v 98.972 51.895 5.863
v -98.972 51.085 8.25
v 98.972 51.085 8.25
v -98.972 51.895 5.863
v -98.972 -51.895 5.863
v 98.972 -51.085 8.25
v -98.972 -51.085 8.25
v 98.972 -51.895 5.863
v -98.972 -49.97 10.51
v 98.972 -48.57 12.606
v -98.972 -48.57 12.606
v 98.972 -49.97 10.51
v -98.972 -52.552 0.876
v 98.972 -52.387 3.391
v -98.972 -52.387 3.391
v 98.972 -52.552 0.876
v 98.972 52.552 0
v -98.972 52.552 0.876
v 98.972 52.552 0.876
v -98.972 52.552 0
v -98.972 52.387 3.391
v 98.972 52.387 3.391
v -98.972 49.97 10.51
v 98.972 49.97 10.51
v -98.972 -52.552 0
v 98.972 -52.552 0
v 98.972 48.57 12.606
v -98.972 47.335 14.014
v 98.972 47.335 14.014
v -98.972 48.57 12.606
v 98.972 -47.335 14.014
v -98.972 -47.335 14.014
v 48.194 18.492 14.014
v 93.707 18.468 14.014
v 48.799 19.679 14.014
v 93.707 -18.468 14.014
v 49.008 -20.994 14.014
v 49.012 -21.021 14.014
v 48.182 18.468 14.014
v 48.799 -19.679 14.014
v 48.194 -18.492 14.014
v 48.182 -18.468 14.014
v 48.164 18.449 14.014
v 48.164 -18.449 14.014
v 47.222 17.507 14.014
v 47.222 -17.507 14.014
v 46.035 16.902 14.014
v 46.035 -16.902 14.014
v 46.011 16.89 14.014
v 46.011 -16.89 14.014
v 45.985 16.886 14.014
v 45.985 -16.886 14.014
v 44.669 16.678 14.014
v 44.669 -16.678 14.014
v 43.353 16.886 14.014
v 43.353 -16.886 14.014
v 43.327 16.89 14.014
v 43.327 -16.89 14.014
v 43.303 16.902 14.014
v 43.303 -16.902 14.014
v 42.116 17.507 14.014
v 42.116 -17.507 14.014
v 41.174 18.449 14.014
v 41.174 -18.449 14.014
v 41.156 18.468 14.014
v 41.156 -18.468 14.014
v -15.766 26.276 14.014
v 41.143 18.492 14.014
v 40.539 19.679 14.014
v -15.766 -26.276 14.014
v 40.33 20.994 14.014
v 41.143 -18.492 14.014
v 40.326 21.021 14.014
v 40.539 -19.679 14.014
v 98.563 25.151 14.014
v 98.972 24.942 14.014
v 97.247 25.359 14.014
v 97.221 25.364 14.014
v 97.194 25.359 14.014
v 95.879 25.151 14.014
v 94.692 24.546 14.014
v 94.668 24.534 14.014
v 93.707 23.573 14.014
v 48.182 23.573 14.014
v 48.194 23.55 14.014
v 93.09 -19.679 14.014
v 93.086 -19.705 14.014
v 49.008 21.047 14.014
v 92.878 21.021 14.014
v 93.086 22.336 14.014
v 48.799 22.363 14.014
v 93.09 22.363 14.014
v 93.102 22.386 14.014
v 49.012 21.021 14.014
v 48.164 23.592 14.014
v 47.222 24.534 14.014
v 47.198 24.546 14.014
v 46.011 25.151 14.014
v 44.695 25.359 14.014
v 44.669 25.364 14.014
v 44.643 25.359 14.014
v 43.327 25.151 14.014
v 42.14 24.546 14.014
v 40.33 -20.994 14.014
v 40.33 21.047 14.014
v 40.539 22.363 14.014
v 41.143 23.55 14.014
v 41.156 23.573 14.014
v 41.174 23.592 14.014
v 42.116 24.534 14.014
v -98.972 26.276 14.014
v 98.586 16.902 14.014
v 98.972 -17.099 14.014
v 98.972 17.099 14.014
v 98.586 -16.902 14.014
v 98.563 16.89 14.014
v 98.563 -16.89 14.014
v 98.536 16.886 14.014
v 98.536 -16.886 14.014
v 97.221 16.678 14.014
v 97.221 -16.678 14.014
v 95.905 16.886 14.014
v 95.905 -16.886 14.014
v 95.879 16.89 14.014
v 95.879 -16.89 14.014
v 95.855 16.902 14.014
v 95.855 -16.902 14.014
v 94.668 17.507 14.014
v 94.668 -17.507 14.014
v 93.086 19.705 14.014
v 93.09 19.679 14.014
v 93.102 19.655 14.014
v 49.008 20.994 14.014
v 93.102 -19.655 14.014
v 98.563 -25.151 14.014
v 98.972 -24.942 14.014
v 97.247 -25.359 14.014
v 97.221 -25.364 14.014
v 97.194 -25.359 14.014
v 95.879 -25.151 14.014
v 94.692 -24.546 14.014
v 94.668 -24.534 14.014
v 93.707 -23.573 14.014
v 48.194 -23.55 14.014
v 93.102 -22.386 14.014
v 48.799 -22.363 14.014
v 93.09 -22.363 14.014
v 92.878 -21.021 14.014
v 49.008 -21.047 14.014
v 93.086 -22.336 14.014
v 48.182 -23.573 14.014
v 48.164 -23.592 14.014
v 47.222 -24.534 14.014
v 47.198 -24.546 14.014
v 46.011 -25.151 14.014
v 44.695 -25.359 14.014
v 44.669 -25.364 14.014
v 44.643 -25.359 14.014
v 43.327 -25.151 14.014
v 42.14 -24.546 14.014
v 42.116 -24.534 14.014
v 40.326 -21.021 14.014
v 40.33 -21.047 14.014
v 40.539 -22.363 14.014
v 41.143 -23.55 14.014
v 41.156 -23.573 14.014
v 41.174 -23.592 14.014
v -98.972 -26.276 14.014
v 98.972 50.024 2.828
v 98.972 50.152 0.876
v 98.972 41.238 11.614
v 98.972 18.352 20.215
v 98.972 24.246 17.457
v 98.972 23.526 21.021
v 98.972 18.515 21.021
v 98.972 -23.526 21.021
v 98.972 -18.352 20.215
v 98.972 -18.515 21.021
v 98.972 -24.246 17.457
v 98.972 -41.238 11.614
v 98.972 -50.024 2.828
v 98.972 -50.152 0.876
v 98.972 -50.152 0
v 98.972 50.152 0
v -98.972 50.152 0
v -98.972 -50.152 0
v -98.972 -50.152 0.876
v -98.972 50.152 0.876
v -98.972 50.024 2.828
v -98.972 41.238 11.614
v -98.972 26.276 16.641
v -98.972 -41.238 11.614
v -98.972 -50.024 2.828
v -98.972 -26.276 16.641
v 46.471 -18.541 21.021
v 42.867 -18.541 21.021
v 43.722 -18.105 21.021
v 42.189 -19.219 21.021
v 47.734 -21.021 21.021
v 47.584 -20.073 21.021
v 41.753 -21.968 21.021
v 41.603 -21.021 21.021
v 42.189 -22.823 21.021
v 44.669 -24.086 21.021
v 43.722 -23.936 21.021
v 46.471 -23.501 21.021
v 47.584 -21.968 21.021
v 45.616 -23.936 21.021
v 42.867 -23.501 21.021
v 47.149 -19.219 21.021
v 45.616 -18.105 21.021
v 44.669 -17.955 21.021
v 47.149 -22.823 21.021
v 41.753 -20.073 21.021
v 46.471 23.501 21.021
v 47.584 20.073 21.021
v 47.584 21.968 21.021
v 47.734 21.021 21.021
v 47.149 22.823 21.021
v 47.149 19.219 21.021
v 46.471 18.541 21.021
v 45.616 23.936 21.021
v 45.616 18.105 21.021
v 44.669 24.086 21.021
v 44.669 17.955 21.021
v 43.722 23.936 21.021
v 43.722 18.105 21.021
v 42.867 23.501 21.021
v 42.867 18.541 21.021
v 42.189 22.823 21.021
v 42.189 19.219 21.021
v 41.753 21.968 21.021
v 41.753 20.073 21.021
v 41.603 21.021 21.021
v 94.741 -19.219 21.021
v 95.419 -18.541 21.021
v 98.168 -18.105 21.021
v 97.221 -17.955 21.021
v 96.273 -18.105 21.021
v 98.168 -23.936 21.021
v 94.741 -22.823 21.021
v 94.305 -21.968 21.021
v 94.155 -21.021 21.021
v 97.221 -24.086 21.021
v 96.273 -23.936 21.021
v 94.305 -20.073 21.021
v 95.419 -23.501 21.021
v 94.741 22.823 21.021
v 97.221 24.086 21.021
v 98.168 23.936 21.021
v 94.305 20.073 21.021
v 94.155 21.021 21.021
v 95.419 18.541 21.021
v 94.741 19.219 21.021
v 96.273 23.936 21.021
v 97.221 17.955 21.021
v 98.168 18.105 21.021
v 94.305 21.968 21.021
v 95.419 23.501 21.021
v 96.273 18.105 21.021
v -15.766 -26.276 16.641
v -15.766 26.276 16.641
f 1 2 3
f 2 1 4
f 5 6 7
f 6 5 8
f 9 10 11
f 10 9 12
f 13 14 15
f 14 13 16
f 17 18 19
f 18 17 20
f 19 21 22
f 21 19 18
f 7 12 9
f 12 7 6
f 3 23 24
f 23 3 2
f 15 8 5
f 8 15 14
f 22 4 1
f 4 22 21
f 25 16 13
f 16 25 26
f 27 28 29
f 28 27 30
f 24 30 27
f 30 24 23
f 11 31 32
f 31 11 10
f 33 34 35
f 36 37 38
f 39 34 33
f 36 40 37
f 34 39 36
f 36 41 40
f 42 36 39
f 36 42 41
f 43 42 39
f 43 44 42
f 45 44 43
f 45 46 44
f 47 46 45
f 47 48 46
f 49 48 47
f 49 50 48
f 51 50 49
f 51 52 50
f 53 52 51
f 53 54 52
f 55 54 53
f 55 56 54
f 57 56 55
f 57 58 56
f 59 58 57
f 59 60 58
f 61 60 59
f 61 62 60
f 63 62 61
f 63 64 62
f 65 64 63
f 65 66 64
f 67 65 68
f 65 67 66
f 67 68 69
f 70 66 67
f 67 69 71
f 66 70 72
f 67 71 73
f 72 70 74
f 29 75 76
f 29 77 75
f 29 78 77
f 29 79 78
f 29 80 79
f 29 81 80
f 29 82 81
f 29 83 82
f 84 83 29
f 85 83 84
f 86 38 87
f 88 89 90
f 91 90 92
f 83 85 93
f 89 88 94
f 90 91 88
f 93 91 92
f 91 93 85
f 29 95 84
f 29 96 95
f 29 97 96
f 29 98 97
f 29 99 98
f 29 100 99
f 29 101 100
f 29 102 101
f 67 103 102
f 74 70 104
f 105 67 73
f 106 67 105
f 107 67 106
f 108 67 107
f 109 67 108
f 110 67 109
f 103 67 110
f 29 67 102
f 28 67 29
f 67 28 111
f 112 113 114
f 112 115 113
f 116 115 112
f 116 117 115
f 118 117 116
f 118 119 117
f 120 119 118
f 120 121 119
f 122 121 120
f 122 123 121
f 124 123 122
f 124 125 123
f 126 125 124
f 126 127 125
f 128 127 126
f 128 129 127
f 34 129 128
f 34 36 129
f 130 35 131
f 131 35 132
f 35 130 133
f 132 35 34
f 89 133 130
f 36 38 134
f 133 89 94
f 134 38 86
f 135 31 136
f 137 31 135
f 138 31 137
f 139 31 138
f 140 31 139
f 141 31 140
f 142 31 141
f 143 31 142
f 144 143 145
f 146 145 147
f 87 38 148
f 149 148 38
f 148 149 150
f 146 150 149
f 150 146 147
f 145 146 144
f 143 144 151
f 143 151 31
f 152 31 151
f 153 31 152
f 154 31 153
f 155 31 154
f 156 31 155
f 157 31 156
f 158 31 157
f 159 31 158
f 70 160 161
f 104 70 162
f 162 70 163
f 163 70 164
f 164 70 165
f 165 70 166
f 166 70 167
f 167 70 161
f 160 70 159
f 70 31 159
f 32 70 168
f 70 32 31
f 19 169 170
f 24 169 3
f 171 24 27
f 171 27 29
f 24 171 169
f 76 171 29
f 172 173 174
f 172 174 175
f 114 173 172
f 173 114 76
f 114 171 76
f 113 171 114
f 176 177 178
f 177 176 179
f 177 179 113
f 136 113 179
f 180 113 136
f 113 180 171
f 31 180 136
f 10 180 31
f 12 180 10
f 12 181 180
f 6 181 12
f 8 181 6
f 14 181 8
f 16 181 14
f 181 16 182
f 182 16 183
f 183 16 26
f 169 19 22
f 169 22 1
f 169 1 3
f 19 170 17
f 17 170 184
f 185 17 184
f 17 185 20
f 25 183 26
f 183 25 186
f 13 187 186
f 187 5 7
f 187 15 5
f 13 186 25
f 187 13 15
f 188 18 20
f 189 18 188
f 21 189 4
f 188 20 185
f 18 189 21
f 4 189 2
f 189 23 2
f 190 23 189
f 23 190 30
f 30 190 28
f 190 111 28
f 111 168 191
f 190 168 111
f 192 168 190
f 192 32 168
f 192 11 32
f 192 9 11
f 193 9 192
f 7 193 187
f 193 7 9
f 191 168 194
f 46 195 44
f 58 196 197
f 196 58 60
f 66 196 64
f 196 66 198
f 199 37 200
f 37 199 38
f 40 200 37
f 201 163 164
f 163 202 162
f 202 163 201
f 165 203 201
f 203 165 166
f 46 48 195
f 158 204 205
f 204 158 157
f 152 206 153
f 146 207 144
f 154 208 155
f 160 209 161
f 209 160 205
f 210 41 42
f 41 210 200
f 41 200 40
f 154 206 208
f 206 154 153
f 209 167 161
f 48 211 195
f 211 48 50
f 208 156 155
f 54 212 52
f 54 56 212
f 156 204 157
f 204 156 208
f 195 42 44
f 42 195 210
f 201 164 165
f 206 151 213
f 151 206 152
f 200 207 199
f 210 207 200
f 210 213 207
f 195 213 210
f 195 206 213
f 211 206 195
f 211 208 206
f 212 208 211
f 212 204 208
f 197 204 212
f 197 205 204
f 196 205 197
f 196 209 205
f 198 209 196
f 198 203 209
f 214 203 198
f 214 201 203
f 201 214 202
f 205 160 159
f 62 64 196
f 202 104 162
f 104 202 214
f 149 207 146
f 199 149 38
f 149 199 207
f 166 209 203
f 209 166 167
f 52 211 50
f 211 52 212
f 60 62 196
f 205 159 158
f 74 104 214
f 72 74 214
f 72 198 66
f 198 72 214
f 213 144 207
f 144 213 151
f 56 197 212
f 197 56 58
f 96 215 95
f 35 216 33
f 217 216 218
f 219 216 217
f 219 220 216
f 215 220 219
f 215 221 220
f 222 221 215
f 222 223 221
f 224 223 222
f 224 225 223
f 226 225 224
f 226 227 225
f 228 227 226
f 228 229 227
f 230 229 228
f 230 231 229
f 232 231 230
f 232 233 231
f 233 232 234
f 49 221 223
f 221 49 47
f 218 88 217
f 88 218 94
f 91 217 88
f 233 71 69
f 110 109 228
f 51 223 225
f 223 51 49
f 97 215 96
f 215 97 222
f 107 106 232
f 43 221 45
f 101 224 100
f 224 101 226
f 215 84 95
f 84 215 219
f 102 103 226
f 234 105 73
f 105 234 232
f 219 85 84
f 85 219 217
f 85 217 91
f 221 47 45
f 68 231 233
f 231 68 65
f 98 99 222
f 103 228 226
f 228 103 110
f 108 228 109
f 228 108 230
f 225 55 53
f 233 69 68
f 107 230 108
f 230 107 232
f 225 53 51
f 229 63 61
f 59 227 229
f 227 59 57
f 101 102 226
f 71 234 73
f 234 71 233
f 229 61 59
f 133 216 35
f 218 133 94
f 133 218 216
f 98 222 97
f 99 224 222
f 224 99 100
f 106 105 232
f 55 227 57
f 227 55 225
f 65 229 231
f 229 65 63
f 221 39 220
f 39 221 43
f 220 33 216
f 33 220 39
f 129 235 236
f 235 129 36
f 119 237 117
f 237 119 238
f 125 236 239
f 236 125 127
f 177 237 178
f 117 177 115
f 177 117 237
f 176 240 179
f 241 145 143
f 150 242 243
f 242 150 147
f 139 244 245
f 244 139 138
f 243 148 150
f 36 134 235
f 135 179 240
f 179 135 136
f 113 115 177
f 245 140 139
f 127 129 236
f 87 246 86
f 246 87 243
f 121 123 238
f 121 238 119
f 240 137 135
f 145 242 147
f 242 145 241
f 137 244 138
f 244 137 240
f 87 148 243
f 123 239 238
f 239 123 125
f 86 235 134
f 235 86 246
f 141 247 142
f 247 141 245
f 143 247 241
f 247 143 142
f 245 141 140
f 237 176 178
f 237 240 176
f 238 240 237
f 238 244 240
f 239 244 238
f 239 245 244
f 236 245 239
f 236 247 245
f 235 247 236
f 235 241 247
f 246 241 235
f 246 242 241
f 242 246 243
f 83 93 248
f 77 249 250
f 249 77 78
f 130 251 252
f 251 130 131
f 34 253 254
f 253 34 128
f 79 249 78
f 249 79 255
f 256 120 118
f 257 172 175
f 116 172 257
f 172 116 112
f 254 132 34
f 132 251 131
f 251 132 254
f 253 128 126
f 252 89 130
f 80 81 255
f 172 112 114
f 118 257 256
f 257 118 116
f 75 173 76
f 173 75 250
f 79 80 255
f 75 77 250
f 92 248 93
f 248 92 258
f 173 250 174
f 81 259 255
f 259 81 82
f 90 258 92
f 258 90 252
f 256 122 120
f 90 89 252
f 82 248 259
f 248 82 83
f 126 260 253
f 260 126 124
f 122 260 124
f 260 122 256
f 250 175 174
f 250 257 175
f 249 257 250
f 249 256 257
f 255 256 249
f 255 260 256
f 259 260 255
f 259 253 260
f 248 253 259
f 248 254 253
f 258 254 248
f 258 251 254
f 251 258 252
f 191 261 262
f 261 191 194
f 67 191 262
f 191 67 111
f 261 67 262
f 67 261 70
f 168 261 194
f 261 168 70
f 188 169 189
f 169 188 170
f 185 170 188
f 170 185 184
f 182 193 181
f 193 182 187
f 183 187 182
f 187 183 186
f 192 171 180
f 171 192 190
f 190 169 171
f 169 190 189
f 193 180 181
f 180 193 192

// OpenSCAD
// Milwaukee Road Little Joe, G scale 1-29 - print 7 of 20: roof_3 - roof, section 3 (print upright)
// Render (F6), export STL, print. Settings: ../../library/lj_params.scad
// Whole loco preview and notes: ../../MILW_LittleJoe_Main.scad
SCALE_SEL = "G";
LOCO_SEL = "E70";   // [E20, E21, E70, E71, E72, E73, E74, E75, E76, E77, E78, E79] the body and roof change for E20 / E21
include <../../library/lj_all.scad>
lj_plate("roof_3");
